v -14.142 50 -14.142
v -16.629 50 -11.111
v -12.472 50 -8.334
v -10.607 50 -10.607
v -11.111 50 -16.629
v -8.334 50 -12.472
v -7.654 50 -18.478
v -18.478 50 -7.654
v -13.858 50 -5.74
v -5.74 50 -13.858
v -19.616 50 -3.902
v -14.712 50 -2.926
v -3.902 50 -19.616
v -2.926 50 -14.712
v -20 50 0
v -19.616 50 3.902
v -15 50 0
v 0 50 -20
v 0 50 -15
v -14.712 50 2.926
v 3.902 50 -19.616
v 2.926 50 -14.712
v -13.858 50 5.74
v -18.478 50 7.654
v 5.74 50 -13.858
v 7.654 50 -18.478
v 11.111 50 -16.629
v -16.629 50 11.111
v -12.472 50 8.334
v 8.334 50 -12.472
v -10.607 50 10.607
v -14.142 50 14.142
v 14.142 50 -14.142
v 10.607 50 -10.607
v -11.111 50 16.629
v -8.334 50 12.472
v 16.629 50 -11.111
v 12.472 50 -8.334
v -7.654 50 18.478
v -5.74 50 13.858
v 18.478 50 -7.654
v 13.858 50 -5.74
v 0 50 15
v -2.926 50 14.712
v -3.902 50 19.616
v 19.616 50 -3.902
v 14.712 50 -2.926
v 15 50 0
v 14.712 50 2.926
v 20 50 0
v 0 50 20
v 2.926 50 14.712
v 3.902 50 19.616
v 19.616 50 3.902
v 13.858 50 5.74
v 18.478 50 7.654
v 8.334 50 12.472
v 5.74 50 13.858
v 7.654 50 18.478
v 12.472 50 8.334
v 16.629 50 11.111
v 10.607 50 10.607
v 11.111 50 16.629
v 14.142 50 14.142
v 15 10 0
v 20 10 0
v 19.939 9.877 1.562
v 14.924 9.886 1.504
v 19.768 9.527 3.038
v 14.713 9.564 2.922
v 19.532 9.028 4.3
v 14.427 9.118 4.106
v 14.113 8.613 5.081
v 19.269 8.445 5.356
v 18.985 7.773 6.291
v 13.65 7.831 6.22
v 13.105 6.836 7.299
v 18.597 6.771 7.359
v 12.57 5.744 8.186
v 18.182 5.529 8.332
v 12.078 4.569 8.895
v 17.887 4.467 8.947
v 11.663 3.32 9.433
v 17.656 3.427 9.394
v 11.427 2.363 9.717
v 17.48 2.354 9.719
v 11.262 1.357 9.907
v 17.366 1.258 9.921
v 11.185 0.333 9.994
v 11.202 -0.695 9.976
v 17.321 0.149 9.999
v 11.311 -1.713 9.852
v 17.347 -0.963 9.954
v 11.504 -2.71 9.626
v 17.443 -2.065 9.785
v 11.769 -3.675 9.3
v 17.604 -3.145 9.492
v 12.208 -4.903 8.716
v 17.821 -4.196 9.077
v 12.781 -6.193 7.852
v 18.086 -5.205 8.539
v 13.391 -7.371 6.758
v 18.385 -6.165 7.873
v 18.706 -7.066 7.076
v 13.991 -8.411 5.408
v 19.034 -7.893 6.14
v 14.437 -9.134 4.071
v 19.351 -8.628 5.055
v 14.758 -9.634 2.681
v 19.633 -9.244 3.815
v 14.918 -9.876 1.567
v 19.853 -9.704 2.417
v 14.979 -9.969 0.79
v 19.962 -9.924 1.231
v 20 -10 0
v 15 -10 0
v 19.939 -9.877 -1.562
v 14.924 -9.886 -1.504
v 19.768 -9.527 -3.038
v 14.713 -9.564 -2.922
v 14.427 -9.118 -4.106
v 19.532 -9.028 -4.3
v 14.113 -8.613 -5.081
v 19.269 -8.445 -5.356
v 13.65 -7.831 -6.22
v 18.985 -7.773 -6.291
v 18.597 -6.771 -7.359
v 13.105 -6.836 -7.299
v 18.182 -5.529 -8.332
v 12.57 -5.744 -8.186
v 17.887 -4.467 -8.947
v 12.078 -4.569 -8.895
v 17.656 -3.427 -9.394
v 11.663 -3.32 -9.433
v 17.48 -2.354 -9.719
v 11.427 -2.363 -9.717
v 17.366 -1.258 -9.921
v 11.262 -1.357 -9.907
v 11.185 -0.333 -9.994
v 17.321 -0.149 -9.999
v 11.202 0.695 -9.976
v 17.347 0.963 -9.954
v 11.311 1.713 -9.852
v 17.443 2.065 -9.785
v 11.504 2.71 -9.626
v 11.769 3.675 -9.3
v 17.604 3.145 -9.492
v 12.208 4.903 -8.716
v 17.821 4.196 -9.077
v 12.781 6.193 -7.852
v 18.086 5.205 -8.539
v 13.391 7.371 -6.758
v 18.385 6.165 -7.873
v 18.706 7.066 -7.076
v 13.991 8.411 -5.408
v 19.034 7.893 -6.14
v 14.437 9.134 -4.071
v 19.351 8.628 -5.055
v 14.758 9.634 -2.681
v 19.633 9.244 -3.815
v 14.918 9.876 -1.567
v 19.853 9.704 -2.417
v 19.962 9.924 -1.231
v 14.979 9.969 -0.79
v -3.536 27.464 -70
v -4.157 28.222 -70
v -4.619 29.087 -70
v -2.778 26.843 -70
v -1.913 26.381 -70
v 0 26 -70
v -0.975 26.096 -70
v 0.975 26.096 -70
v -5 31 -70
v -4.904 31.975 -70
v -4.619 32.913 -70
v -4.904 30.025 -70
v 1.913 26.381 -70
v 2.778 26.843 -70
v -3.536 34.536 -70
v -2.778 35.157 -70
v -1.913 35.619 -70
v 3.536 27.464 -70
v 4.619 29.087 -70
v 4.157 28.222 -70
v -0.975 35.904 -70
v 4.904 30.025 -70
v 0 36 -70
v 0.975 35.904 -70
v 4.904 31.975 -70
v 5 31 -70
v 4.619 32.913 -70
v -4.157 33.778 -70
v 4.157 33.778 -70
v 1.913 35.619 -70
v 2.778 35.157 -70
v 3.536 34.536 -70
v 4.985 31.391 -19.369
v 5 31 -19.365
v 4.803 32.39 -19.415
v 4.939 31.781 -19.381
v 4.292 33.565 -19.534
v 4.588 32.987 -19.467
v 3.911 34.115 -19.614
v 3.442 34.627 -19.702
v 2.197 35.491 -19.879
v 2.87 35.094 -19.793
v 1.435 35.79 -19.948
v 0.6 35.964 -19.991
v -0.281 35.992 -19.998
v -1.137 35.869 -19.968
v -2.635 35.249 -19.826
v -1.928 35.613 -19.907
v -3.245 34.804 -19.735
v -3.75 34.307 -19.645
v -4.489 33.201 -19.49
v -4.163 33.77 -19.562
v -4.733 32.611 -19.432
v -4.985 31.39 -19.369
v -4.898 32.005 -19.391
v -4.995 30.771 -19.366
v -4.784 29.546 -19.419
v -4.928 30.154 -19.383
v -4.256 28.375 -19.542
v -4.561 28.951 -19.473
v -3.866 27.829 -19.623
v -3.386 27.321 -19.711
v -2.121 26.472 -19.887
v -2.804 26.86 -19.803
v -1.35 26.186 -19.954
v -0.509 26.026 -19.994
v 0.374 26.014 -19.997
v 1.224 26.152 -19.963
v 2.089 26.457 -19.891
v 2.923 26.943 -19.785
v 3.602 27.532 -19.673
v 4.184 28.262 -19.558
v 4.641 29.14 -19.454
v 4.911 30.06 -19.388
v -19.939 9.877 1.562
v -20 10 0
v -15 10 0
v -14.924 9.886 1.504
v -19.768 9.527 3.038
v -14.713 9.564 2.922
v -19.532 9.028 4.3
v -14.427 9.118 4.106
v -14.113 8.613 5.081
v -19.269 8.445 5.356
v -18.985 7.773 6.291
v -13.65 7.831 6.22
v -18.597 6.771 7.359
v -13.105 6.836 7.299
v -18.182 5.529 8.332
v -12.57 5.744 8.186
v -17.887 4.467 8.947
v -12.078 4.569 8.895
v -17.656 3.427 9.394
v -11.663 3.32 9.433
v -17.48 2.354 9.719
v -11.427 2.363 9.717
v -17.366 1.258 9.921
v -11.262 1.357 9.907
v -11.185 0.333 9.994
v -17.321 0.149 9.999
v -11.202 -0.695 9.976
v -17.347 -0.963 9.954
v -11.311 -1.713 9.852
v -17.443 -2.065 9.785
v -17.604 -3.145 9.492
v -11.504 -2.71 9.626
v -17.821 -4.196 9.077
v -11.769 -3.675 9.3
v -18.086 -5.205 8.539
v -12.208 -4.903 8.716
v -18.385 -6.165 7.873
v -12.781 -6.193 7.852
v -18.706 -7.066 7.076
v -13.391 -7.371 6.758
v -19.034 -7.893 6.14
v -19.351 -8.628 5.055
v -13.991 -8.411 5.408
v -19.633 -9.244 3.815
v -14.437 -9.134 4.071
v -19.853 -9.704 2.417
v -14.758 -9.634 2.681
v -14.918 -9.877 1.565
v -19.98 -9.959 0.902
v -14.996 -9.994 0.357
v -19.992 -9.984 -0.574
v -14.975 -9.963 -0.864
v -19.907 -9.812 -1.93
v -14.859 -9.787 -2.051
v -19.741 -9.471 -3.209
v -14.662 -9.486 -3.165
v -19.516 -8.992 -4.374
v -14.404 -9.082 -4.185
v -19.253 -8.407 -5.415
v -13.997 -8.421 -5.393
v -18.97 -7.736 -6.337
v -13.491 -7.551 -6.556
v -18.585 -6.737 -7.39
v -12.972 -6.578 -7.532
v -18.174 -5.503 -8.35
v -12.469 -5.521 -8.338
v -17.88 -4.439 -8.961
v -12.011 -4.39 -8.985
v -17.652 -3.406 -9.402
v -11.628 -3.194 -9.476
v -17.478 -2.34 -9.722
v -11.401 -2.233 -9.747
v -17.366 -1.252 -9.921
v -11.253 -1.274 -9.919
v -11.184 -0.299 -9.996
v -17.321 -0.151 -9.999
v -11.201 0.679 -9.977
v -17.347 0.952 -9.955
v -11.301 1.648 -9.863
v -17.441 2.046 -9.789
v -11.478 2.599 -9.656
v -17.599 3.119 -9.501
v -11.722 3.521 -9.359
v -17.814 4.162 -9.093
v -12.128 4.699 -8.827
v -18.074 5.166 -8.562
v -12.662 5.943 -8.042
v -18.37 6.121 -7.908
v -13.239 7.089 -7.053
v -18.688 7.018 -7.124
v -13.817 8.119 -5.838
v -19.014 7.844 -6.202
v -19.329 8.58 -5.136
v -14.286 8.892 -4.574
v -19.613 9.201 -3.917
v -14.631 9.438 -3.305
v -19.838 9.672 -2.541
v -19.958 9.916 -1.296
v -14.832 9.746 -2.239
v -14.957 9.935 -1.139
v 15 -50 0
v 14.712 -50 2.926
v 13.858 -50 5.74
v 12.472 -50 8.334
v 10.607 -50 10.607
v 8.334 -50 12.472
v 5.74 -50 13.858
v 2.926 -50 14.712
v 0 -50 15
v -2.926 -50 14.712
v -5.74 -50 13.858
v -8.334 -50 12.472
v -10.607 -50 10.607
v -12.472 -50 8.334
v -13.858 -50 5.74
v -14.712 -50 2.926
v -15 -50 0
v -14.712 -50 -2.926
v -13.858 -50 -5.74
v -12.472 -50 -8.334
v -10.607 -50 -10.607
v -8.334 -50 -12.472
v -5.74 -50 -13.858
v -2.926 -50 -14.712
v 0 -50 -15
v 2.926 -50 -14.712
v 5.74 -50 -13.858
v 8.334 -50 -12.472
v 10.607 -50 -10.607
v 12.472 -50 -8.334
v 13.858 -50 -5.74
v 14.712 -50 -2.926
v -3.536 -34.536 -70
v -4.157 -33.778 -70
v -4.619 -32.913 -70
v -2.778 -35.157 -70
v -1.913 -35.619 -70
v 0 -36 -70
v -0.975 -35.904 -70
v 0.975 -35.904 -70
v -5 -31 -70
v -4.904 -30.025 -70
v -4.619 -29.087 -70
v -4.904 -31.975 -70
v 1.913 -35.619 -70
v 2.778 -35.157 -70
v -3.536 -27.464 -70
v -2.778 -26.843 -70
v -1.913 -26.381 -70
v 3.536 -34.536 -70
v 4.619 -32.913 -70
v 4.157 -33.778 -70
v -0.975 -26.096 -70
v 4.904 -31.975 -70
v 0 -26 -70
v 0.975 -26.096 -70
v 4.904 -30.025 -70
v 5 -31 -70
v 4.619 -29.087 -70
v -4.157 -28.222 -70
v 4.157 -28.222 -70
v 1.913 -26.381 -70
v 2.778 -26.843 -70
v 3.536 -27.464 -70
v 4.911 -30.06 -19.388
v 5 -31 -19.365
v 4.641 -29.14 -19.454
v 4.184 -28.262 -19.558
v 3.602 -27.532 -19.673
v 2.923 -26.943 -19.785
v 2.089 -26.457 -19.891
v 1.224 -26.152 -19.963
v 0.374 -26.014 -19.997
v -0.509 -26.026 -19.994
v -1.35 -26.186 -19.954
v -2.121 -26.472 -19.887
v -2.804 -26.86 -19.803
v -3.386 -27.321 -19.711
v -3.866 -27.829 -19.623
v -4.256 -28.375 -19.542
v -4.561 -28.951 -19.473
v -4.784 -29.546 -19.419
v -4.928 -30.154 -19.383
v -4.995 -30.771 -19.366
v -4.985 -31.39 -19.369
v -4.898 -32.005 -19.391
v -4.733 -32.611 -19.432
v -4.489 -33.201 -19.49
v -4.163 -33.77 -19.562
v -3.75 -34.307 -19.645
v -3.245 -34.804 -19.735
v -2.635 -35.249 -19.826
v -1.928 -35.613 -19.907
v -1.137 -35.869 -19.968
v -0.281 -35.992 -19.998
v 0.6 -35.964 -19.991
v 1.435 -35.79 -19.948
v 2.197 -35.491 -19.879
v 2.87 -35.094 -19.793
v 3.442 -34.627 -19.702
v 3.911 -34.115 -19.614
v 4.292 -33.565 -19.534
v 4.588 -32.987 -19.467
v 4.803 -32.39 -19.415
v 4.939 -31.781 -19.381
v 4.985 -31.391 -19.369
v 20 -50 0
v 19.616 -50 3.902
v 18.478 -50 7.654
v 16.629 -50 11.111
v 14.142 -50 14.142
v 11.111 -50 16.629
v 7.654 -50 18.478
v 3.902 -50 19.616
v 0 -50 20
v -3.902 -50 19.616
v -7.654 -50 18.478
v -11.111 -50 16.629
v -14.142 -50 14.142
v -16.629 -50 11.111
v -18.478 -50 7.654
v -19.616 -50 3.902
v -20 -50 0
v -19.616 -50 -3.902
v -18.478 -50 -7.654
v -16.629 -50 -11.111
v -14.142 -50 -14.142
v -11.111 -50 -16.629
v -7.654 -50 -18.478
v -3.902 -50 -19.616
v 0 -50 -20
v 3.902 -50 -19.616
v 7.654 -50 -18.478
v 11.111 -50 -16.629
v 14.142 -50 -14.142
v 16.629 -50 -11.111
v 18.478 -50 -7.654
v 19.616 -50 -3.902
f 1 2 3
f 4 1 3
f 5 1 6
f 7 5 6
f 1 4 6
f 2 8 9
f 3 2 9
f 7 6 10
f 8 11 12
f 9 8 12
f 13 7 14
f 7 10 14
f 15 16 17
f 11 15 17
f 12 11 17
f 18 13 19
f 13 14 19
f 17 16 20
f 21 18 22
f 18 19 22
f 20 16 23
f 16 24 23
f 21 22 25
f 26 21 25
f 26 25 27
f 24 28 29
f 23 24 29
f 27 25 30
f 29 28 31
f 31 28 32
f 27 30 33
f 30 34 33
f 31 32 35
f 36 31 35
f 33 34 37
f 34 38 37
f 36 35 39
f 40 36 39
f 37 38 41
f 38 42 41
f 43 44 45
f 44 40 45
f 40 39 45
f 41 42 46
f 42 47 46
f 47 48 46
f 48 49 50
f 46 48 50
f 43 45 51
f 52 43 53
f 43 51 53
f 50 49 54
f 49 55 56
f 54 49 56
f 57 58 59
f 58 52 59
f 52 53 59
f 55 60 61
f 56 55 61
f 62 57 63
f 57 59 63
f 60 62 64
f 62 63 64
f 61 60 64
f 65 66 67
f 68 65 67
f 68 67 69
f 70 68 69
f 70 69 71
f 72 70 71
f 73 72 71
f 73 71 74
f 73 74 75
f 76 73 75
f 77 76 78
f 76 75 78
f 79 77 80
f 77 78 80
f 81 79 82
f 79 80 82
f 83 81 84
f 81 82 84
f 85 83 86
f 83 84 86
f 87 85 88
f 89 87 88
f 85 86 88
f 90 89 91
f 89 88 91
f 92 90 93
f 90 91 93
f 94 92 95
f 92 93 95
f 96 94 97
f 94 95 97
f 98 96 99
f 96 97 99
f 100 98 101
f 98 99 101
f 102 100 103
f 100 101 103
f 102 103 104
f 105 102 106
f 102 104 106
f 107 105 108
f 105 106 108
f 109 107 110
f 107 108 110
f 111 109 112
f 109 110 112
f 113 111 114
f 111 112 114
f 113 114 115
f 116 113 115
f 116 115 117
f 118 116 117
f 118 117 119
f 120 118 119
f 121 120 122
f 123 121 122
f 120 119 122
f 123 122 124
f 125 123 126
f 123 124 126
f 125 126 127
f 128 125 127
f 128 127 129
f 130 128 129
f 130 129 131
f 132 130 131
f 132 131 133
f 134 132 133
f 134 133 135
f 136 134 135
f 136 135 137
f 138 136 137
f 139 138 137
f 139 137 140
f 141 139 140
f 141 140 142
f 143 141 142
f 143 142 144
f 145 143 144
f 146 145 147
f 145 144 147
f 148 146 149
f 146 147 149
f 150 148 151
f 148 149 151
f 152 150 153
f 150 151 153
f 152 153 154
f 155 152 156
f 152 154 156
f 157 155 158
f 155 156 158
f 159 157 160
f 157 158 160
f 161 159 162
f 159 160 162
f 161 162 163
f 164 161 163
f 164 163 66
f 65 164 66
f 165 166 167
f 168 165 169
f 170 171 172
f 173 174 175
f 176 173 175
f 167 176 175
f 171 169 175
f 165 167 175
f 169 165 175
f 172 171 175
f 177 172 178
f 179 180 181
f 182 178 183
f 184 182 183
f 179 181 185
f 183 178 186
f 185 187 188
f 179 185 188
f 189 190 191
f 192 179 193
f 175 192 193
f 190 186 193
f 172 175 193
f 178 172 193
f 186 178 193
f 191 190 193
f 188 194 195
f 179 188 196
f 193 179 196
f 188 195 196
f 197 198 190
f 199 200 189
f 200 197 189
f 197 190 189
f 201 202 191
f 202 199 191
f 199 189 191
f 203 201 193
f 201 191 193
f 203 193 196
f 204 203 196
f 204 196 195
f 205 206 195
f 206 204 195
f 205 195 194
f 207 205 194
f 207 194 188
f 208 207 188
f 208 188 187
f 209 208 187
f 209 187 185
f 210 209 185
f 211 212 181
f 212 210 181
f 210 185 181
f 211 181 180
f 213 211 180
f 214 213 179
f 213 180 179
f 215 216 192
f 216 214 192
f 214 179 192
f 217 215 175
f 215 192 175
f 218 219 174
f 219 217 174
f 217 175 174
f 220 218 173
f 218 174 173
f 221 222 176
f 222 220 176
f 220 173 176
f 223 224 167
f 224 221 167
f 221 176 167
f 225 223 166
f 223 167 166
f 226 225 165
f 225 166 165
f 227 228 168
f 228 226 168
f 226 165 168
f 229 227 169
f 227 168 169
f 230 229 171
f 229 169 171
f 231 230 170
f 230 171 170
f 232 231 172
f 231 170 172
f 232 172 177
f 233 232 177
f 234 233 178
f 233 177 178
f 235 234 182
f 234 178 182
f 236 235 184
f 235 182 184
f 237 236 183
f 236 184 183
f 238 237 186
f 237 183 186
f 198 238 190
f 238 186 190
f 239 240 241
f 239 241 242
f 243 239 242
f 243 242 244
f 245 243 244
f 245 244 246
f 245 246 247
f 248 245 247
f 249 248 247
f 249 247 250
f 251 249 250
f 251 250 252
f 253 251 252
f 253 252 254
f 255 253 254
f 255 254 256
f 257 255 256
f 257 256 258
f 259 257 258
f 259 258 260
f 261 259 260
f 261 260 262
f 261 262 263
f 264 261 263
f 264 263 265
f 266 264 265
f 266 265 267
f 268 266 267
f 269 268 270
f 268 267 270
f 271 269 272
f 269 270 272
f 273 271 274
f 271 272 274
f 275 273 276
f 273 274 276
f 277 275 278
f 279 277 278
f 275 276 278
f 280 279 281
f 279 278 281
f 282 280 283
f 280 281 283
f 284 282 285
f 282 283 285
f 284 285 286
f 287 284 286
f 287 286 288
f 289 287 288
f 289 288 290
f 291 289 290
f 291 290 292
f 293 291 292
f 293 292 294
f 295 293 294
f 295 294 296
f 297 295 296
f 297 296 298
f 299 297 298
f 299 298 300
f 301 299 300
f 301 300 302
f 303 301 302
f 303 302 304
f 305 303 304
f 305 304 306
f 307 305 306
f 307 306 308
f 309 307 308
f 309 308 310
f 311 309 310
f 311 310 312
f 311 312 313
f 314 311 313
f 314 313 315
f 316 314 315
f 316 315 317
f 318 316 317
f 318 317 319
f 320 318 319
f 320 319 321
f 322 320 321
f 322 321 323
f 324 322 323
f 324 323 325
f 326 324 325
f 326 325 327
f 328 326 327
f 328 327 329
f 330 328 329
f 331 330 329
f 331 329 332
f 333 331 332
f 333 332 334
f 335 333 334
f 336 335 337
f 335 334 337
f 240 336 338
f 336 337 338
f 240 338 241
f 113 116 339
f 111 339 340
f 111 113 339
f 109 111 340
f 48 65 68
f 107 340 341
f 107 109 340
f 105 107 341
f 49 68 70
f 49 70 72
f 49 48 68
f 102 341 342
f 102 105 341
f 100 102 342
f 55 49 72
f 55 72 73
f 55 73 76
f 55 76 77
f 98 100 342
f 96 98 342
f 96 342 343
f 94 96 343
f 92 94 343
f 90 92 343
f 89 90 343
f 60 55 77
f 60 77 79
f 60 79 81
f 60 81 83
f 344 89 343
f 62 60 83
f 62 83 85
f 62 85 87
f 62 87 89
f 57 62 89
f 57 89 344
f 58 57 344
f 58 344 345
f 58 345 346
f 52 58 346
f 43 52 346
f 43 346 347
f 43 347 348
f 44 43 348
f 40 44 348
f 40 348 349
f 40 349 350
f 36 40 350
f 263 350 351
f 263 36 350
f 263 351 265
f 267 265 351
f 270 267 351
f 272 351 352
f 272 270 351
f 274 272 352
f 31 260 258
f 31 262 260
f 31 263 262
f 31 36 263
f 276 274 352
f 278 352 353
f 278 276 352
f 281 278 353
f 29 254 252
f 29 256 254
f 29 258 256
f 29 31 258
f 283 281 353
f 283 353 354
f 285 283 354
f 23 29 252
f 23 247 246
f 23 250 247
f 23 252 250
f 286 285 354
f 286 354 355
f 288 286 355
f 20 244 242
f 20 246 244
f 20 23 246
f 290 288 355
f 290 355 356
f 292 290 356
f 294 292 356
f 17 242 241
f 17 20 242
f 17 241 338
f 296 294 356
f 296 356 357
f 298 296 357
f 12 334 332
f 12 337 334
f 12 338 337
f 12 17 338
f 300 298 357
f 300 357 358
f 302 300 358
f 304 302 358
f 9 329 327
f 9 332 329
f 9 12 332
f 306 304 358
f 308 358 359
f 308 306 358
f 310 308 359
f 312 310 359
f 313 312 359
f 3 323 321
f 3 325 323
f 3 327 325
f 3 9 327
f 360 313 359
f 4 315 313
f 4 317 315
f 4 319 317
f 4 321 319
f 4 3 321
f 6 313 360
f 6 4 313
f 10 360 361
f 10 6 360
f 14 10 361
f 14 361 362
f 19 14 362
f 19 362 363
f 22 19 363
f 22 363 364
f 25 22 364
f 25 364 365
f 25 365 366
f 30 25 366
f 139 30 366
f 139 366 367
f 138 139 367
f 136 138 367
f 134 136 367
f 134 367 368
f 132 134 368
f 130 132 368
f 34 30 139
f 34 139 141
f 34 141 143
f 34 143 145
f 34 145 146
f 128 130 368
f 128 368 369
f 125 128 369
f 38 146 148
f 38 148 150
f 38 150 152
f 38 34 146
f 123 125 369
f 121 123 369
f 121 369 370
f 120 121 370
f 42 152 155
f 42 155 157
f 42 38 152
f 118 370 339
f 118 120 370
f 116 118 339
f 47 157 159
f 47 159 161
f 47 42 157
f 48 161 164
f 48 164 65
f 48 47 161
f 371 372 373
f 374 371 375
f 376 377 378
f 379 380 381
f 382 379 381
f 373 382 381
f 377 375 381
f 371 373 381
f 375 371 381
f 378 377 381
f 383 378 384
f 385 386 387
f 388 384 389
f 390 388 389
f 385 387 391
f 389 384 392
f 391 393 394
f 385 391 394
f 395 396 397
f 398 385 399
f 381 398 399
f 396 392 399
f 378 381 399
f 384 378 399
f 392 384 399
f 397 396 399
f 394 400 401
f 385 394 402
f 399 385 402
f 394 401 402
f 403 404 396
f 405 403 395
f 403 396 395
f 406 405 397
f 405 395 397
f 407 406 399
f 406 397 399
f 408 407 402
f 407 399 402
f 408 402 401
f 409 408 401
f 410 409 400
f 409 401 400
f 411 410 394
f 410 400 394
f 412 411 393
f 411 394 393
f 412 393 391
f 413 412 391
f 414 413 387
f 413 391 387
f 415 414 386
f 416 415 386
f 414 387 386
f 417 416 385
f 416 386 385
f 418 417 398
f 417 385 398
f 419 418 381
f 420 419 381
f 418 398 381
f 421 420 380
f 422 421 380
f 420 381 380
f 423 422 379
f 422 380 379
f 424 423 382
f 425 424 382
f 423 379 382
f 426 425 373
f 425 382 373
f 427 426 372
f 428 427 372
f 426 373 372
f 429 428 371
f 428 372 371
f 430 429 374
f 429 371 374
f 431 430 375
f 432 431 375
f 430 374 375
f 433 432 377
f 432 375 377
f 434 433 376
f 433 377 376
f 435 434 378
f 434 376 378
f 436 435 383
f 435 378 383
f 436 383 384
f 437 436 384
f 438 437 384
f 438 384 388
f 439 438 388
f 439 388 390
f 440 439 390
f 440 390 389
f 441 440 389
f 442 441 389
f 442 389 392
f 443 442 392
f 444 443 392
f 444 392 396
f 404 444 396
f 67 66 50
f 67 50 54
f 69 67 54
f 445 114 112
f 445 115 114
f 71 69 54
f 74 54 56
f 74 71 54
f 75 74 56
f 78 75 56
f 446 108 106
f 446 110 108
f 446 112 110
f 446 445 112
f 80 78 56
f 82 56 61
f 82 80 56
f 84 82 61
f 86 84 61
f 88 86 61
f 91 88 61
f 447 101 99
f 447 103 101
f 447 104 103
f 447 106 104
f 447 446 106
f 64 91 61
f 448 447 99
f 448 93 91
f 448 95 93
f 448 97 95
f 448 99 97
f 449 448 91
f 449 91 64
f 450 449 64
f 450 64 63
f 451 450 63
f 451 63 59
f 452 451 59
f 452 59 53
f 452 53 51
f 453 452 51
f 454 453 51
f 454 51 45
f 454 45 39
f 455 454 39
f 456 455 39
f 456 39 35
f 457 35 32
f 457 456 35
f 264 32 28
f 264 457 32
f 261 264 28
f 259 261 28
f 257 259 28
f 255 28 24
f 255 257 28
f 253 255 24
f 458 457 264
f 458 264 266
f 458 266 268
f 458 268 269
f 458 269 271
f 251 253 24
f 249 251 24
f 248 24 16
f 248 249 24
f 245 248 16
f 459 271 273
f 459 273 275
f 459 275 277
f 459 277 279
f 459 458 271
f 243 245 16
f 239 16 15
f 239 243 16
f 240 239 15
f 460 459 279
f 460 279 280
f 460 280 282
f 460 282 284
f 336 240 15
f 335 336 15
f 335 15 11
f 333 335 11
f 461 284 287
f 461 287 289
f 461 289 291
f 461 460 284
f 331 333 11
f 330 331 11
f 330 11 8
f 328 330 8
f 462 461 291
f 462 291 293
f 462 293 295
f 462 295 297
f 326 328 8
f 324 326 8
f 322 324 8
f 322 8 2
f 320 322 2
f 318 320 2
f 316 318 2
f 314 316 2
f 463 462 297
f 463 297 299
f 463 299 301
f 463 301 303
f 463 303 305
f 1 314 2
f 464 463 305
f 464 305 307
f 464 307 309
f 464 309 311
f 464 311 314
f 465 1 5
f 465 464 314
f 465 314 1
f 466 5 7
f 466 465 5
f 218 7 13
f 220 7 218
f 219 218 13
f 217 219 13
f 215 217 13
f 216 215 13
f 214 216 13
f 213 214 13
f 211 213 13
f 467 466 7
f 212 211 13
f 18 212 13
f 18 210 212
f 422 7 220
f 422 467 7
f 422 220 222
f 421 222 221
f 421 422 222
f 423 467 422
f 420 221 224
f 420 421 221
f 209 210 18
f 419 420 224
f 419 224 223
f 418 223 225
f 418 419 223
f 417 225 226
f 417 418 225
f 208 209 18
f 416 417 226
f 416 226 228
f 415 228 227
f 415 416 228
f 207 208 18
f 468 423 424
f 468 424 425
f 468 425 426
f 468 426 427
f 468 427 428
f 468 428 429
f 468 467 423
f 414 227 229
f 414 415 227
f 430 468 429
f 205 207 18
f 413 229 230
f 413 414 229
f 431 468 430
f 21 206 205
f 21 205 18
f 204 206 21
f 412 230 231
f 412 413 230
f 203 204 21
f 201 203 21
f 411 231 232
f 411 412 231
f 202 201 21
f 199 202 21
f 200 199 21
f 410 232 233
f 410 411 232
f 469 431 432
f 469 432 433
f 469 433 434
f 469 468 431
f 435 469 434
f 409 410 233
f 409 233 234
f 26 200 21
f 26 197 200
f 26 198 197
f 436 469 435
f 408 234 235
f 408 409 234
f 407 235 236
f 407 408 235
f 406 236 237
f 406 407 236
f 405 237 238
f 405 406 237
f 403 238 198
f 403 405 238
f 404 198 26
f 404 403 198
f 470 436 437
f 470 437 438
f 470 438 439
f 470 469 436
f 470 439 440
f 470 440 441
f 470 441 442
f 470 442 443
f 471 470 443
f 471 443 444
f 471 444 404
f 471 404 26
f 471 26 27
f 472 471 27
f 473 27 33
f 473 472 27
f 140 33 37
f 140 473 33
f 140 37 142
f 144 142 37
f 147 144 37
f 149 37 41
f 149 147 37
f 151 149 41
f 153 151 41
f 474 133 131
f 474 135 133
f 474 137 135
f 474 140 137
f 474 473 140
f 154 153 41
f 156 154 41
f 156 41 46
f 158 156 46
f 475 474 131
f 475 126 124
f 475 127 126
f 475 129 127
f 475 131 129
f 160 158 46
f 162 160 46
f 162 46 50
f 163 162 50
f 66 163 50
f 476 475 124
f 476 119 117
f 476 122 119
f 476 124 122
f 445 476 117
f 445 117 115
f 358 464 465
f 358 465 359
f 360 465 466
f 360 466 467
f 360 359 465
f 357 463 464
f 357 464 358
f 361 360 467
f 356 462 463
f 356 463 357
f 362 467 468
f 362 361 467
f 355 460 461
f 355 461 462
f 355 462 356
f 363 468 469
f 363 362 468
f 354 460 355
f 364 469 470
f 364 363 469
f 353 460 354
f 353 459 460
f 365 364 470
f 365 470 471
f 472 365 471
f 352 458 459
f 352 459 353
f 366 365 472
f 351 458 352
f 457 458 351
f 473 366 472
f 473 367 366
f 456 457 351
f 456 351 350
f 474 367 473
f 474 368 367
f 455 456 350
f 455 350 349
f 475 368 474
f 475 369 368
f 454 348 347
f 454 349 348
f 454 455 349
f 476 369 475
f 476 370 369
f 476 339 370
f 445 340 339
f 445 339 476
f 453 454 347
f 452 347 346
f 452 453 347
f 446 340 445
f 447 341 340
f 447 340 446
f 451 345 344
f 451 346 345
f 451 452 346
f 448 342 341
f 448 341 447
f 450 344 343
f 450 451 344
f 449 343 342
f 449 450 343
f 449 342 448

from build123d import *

# Parameters (mm, degrees)
F0_R          = 20
F0_R_2        = 15
F1_DEPTH      = 50
F3_R          = 5
F4_DEPTH      = 50
F4_DEPTH_BACK = 4
F6_R          = 10
F7_DEPTH      = 50


with BuildPart() as f1:
    # F0 (on Front) → F1 (new body, symmetric)
    with BuildSketch(Plane.XZ):
        Circle(F0_R)
        Circle(F0_R_2, mode=Mode.SUBTRACT)
    extrude(amount=F1_DEPTH, both=True)

    # F3 (on offset) → F4 (join, two sides)
    with BuildSketch(Plane.XY.offset(-20)) as f4_sk:
        with Locations((0, 30.9999954911)):
            Circle(F3_R)
        with Locations((0, -30.9999954911)):
            Circle(F3_R)
    extrude(amount=-F4_DEPTH)
    extrude(f4_sk.sketch, amount=F4_DEPTH_BACK)

    # F6 (on offset) → F7 (cut)
    with BuildSketch(Plane.YZ.offset(20)):
        Circle(F6_R)
    extrude(amount=-F7_DEPTH, mode=Mode.SUBTRACT)


solid = f1.part
